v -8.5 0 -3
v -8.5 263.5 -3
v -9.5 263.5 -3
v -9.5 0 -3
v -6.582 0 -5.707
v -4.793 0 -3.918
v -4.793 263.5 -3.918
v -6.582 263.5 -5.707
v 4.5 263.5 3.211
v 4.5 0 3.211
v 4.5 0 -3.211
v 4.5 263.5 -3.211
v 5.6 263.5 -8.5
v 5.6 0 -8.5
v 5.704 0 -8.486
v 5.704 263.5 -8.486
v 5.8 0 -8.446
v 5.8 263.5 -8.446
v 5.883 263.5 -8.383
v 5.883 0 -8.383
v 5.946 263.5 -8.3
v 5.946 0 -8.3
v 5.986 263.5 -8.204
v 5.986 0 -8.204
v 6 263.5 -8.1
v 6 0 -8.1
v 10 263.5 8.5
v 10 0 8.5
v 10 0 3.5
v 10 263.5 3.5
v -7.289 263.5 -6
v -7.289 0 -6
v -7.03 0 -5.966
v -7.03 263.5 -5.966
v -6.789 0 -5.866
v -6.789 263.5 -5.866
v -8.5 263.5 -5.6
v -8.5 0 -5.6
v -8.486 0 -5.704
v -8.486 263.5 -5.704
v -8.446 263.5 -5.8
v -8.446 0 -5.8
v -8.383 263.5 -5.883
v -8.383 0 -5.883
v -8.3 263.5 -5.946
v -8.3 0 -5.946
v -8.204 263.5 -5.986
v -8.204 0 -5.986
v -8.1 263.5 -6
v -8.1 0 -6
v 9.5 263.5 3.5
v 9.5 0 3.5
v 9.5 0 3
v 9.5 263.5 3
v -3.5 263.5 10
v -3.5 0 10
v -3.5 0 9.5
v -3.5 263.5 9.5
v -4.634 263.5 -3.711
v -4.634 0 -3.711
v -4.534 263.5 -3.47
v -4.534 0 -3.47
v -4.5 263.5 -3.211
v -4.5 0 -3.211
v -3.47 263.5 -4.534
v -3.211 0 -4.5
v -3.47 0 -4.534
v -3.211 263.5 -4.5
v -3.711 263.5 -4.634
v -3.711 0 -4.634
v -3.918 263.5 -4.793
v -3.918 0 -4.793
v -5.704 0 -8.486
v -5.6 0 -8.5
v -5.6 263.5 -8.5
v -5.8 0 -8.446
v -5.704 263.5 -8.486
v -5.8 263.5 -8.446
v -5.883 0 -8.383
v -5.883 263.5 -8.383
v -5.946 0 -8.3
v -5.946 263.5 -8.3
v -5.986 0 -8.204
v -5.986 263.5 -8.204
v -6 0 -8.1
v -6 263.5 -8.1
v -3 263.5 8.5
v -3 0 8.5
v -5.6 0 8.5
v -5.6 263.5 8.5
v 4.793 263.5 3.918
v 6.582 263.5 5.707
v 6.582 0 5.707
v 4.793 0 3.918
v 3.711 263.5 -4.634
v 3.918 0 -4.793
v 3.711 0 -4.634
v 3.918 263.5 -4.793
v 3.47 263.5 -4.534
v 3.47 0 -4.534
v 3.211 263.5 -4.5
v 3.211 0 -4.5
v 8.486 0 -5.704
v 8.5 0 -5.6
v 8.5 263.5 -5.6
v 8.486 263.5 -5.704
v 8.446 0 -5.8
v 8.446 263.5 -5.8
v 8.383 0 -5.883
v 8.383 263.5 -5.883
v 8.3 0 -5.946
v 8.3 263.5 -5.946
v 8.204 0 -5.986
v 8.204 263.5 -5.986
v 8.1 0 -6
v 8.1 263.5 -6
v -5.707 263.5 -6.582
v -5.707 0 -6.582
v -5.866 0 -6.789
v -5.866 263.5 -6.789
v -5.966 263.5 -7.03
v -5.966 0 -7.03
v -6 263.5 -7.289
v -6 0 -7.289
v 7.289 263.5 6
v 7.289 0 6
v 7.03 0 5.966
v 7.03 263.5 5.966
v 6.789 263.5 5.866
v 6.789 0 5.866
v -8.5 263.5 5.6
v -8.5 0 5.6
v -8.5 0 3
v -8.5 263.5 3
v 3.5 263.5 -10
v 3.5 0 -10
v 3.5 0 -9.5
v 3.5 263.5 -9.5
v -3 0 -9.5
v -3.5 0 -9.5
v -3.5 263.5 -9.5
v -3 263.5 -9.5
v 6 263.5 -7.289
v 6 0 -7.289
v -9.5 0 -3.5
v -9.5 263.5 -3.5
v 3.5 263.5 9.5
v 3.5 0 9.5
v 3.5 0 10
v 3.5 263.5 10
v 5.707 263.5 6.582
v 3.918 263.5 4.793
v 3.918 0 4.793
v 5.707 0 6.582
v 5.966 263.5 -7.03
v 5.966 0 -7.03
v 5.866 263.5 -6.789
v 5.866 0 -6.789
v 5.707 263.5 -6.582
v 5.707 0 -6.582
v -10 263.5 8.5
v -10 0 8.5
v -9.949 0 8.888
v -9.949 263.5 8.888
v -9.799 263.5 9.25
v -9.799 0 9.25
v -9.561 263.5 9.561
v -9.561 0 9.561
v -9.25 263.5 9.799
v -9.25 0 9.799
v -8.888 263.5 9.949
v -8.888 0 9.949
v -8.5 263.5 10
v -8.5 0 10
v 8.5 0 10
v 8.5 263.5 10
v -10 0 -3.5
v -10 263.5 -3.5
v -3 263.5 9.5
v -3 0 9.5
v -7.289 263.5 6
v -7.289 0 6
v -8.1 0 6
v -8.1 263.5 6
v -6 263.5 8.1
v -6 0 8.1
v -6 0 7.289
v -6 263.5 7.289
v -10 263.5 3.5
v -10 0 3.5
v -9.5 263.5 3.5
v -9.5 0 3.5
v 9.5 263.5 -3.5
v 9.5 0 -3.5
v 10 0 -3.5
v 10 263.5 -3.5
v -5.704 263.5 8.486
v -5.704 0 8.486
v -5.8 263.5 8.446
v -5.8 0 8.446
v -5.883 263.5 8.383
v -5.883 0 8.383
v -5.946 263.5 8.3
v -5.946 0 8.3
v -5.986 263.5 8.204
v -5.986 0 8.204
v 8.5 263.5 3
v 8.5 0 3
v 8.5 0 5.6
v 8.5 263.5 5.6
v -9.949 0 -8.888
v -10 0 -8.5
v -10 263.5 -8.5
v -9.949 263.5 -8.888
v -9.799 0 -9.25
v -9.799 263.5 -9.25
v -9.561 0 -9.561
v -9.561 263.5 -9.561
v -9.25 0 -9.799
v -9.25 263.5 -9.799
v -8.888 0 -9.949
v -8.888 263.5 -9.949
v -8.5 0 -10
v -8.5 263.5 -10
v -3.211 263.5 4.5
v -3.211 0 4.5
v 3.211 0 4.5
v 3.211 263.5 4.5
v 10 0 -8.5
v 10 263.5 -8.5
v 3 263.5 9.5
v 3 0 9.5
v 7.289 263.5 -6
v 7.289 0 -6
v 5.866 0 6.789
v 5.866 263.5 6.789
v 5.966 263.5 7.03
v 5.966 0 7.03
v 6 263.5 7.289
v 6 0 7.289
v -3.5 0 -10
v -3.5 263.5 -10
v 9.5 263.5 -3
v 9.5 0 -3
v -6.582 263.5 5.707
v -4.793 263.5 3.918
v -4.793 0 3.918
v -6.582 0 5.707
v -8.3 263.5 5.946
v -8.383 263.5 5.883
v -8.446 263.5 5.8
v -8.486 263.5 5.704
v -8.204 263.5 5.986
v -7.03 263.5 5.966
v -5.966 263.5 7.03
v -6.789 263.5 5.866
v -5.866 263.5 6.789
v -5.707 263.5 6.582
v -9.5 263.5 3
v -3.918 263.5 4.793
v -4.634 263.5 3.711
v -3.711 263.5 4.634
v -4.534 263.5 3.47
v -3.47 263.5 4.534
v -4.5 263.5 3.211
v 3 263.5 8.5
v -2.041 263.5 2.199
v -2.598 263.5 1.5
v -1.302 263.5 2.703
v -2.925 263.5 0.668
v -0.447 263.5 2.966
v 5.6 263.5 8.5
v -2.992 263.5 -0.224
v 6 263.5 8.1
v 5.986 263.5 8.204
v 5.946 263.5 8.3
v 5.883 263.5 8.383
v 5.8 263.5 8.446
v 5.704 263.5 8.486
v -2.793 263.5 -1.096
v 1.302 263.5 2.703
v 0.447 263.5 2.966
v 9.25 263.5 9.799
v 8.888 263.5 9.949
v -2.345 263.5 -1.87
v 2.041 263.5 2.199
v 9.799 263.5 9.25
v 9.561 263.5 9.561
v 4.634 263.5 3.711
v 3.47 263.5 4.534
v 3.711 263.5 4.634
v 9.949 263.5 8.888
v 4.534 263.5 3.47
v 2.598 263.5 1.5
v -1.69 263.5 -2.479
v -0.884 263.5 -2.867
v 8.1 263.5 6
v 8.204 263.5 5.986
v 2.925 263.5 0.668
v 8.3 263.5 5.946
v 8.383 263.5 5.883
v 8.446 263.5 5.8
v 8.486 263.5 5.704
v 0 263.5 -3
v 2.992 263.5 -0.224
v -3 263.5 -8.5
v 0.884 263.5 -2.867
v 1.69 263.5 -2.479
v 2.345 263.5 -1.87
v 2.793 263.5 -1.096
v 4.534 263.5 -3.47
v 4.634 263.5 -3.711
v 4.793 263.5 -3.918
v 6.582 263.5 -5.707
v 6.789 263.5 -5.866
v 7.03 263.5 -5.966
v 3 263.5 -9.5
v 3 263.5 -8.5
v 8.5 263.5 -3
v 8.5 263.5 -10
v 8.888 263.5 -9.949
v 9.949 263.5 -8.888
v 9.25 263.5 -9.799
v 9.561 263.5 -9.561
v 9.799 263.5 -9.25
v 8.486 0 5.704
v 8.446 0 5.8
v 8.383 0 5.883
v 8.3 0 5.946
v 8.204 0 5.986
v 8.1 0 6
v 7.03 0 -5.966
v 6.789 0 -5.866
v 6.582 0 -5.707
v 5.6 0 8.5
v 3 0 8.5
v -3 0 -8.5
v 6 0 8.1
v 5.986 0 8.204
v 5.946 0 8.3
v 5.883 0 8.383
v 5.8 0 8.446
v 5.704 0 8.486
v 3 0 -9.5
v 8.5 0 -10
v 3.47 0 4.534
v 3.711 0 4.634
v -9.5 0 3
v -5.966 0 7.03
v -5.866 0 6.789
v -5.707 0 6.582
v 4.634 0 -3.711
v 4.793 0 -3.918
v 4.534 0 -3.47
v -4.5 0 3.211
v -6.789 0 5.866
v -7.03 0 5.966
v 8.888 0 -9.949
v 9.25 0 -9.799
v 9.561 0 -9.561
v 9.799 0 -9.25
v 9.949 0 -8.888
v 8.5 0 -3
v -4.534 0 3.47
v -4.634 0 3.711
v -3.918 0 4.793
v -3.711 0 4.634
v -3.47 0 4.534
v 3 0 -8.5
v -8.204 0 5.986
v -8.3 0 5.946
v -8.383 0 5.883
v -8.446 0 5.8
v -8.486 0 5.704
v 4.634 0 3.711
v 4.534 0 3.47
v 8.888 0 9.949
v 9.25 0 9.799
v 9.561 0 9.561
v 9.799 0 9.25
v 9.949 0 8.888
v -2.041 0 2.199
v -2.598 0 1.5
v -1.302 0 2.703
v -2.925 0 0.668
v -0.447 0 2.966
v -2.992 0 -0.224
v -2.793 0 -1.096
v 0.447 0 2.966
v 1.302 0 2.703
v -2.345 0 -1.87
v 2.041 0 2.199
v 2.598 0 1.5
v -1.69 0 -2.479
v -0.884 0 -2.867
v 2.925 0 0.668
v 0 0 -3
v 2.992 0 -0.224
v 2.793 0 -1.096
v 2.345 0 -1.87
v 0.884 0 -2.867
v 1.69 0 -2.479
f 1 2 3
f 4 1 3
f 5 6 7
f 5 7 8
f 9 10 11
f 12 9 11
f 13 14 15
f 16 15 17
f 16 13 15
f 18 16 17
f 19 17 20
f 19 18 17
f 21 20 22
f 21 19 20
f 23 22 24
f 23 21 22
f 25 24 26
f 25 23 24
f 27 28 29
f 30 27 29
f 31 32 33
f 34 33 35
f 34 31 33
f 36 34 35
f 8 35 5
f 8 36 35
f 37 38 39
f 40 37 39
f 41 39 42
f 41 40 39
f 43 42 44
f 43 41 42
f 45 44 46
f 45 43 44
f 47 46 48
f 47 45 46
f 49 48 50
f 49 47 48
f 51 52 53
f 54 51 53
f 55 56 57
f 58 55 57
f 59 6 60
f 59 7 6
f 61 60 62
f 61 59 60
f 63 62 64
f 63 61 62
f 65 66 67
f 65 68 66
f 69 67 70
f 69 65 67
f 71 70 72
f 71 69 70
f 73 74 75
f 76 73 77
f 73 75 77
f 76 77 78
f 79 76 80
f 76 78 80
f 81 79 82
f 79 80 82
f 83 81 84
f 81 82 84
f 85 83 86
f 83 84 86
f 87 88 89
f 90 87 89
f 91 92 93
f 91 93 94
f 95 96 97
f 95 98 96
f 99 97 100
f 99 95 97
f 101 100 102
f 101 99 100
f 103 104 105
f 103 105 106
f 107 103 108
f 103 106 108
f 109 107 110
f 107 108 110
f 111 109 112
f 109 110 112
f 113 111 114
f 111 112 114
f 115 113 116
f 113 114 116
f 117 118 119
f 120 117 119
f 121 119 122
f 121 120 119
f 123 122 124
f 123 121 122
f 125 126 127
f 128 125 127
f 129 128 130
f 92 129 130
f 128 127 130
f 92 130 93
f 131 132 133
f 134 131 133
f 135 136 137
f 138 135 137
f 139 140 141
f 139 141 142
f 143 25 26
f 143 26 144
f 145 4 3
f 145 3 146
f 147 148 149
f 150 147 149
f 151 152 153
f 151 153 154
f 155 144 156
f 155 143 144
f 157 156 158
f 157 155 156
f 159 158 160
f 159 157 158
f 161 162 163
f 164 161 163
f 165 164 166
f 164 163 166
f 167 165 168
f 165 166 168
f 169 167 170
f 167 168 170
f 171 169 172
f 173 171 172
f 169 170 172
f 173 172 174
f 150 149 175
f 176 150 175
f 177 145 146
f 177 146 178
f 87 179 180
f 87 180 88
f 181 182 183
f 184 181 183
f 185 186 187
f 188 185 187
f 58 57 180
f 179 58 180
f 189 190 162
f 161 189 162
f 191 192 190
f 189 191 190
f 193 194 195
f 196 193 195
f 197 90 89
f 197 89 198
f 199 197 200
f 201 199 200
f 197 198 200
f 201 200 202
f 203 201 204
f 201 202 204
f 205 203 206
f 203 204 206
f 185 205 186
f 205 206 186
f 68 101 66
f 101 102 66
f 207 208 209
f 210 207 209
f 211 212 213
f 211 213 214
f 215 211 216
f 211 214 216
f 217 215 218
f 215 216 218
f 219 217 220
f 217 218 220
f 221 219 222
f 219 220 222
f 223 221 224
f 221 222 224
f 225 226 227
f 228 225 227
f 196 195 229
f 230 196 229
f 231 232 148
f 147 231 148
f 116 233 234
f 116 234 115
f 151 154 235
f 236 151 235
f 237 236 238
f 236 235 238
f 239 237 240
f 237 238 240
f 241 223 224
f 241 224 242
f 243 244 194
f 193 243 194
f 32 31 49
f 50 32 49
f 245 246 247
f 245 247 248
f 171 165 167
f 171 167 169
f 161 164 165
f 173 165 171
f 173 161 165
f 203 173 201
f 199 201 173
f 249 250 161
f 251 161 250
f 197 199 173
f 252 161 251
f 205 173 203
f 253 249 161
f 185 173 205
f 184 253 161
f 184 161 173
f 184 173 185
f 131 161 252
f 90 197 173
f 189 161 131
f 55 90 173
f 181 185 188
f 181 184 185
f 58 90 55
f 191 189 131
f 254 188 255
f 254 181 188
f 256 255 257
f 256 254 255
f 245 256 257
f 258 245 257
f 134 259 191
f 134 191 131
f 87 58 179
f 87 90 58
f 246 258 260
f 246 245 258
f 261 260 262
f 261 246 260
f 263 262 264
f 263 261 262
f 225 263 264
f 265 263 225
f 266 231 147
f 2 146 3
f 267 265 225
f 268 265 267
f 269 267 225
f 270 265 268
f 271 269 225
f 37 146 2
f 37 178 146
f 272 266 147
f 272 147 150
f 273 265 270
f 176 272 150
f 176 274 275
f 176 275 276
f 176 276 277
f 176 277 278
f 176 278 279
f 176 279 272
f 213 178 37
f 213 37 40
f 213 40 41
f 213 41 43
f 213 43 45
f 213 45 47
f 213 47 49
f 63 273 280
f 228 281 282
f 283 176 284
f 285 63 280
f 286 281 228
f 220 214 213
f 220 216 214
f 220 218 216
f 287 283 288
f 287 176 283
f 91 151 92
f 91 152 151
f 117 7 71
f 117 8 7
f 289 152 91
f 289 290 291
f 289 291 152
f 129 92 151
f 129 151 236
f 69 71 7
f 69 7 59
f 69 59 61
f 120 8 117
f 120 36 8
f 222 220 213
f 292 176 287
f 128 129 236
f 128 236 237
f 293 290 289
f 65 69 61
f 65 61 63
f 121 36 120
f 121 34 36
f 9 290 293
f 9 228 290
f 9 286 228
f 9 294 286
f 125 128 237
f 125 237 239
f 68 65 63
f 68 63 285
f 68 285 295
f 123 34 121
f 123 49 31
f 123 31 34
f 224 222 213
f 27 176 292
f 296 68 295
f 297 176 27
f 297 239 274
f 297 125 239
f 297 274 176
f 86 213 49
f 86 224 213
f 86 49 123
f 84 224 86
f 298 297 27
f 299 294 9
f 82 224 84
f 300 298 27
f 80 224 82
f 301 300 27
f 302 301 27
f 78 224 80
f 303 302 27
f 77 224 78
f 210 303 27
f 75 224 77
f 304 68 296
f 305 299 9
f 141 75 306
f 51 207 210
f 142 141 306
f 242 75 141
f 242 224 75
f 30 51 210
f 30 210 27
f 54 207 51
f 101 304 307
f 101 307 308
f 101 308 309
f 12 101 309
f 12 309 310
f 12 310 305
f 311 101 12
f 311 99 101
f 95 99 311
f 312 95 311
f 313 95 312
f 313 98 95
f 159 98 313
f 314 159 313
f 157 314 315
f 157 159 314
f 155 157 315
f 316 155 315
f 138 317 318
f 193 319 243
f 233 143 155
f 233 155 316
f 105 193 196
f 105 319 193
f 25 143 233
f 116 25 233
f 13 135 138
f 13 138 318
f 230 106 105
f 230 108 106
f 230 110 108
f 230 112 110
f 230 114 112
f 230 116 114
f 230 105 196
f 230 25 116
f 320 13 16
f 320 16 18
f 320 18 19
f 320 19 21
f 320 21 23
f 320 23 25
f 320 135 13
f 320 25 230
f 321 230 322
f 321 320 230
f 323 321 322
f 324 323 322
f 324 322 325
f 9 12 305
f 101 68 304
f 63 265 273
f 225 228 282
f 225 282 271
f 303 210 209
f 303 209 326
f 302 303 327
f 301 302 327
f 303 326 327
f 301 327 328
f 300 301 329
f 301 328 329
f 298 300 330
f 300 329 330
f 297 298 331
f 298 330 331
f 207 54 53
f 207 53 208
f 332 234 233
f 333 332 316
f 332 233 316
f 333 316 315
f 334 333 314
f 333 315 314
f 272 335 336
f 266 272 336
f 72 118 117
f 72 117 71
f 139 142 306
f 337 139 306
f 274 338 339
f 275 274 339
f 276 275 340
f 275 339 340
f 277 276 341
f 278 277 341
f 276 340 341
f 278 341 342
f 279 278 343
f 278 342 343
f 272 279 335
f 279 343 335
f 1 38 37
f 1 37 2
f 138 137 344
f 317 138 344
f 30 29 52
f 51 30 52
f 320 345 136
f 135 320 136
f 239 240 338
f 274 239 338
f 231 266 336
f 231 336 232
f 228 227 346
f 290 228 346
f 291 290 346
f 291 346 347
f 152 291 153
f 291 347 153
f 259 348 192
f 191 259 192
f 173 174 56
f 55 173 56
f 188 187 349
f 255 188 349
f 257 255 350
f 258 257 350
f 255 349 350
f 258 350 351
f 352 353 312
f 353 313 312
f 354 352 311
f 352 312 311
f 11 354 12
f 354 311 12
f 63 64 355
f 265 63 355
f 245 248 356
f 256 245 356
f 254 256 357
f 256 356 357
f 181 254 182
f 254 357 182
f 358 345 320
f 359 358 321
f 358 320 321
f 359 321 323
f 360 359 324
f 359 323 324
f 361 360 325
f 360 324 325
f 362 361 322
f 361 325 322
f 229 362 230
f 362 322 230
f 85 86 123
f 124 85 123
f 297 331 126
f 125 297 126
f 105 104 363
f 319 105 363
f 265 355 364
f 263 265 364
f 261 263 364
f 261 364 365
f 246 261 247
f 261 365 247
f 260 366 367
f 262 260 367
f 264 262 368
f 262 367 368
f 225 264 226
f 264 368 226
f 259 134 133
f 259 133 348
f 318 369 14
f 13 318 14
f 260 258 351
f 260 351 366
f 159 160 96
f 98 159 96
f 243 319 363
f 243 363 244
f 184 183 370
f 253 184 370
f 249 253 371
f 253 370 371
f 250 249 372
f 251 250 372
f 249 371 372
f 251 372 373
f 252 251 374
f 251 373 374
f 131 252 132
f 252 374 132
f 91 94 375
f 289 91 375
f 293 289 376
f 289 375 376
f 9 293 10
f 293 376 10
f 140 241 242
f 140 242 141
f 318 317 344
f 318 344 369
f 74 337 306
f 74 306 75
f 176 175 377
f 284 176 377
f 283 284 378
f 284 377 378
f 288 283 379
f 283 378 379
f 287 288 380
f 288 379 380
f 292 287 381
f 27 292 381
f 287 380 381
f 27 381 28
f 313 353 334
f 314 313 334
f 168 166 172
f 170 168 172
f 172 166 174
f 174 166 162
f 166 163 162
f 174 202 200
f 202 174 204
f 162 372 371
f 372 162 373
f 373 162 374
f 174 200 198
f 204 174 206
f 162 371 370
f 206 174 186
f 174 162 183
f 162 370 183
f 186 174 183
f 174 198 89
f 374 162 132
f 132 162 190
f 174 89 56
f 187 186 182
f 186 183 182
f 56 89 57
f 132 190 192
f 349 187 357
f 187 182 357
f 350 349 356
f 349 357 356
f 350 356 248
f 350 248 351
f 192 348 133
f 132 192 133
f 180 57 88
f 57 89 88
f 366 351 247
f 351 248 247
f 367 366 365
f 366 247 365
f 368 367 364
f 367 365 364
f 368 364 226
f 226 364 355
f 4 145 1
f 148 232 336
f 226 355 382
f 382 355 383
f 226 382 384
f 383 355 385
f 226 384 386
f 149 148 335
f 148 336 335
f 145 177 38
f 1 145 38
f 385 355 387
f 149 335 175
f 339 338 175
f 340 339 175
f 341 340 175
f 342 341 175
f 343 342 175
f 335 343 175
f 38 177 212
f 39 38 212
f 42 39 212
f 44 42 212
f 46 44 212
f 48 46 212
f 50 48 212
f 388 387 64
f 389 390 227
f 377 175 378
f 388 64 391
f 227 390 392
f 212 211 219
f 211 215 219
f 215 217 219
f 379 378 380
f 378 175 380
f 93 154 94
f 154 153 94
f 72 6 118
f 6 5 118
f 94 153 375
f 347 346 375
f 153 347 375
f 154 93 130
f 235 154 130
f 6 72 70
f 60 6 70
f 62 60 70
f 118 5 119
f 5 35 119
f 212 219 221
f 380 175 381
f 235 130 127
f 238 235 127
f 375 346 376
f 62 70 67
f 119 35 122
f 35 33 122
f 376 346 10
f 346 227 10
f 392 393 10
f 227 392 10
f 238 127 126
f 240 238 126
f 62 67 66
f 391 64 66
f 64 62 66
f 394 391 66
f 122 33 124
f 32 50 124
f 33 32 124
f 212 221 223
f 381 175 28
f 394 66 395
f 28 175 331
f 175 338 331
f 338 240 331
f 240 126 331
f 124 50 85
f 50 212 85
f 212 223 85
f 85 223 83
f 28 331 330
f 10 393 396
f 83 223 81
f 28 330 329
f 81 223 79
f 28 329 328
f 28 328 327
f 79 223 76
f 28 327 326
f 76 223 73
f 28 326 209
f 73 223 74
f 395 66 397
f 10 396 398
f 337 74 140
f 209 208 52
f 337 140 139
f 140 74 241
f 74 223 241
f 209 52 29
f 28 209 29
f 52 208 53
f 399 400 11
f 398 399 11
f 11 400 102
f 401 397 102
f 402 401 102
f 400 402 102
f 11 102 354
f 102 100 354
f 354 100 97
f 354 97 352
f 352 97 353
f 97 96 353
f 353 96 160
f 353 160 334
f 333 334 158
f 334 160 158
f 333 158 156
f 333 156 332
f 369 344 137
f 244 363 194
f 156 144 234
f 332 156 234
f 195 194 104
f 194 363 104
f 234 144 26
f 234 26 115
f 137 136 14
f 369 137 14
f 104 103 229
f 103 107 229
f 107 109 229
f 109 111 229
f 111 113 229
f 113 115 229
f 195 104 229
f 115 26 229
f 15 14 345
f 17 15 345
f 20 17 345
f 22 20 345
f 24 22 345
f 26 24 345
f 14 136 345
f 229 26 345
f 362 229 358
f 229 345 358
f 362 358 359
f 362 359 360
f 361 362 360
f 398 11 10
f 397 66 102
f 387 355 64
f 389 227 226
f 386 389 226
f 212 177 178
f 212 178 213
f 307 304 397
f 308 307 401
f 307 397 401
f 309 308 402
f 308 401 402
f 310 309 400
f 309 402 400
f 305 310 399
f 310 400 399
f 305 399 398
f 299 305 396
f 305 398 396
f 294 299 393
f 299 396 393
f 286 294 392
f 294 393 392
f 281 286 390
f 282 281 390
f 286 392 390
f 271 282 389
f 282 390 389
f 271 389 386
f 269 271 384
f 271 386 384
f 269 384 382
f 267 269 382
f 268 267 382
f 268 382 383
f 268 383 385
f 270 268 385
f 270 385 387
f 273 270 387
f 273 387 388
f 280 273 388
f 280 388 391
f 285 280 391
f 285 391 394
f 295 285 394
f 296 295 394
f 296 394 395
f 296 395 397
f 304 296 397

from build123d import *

# Parameters (mm, degrees)
BOSS_EXTRU_1_CORPS_DEPTH    = 263.5
CONG_1_R                    = 1.5
CONG_2_R                    = 0.4
CONG_4_R                    = 1
CONG_1_OF_SYM_TRIE_BRAS_R   = 1.5
CONG_2_OF_SYM_TRIE_BRAS_R   = 0.4
CONG_4_OF_SYM_TRIE_BRAS_R   = 1
SYM_TRIE_BRAS_DOUBLE_DEPTH  = 263.5
APR_S_TARODAGE_M6_R         = 3
ENL_V_MAT_FILETAGE_M6_DEPTH = 264.879233741


# Read off the part's stored shape, not the designer's step: Symétrie Bras double
with BuildPart() as part:
    # Esquisse4 → Boss.-Extru.1 Corps (new body)
    with BuildSketch(Plane(origin=(0, 0, 0), x_dir=(1, 0, 0), z_dir=(0, 1, 0))):
        Polygon((0, 0), (-4.5, 0), (-4.5, 3.625), (-6.875, 6), (-8.5, 6), (-8.5, 3), (-9.5, 3), (-9.5, 3.5), (-10, 3.5), (-10, 10), (-3.5, 10), (-3.5, 9.5), (-3, 9.5), (-3, 8.5), (-6, 8.5), (-6, 6.875), (-3.625, 4.5), (0, 4.5), align=None)
    boss_extru_1_corps = extrude(amount=BOSS_EXTRU_1_CORPS_DEPTH)

    # Congé1
    cong_1_edges = [part.edges().sort_by_distance(p)[0] for p in [
        (-10, 131.75, -10),
    ]]
    fillet(cong_1_edges, radius=CONG_1_R)

    # Congé2
    cong_2_edges = [part.edges().sort_by_distance(p)[0] for p in [
        (-8.5, 131.75, -6),
        (-6, 131.75, -8.5),
    ]]
    fillet(cong_2_edges, radius=CONG_2_R)

    # Congé4
    cong_4_edges = [part.edges().sort_by_distance(p)[0] for p in [
        (-4.5, 131.75, -3.625),
        (-6.875, 131.75, -6),
        (-6, 131.75, -6.875),
        (-3.625, 131.75, -4.5),
    ]]
    fillet(cong_4_edges, radius=CONG_4_R)

    # Symétrie Bras: Boss.-Extru.1 Corps across plane
    add(boss_extru_1_corps.mirror(Plane(origin=(0, 263.5, -4.5), x_dir=(0, 0, 1), z_dir=(-1, 0, 0))))

    # Congé1 of Symétrie Bras
    cong_1_of_sym_trie_bras_edges = [part.edges().sort_by_distance(p)[0] for p in [
        (10, 131.75, -10),
    ]]
    fillet(cong_1_of_sym_trie_bras_edges, radius=CONG_1_OF_SYM_TRIE_BRAS_R)

    # Congé2 of Symétrie Bras
    cong_2_of_sym_trie_bras_edges = [part.edges().sort_by_distance(p)[0] for p in [
        (8.5, 131.75, -6),
        (6, 131.75, -8.5),
    ]]
    fillet(cong_2_of_sym_trie_bras_edges, radius=CONG_2_OF_SYM_TRIE_BRAS_R)

    # Congé4 of Symétrie Bras
    cong_4_of_sym_trie_bras_edges = [part.edges().sort_by_distance(p)[0] for p in [
        (4.5, 131.75, -3.625),
        (6.875, 131.75, -6),
        (6, 131.75, -6.875),
        (3.625, 131.75, -4.5),
    ]]
    fillet(cong_4_of_sym_trie_bras_edges, radius=CONG_4_OF_SYM_TRIE_BRAS_R)

    # Symétrie Bras double outline → Symétrie Bras double (add)
    with BuildSketch(Plane(origin=(0, 0, 0), x_dir=(1, 0, 0), z_dir=(0, 1, 0))):
        with BuildLine():
            ThreePointArc((7.289213562, -6), (6.90653013, -5.923879533), (6.582106781, -5.707106781))
            Line((6.582106781, -5.707106781), (4.792893219, -3.917893219))
            ThreePointArc((4.792893219, -3.917893219), (4.576120467, -3.59346987), (4.5, -3.210786438))
            Line((4.5, -3.210786438), (4.5, 0))
            Line((4.5, 0), (-4.5, 0))
            Line((-4.5, 0), (-4.5, -3.210786438))
            ThreePointArc((-4.5, -3.210786438), (-4.576120467, -3.59346987), (-4.792893219, -3.917893219))
            Line((-4.792893219, -3.917893219), (-6.582106781, -5.707106781))
            ThreePointArc((-6.582106781, -5.707106781), (-6.90653013, -5.923879533), (-7.289213562, -6))
            Line((-7.289213562, -6), (-8.1, -6))
            ThreePointArc((-8.1, -6), (-8.382842712, -5.882842712), (-8.5, -5.6))
            Line((-8.5, -5.6), (-8.5, -3))
            Line((-8.5, -3), (-9.5, -3))
            Line((-9.5, -3), (-9.5, -3.5))
            Line((-9.5, -3.5), (-10, -3.5))
            Line((-10, -3.5), (-10, -8.5))
            ThreePointArc((-10, -8.5), (-9.560660172, -9.560660172), (-8.5, -10))
            Line((-8.5, -10), (-3.5, -10))
            Line((-3.5, -10), (-3.5, -9.5))
            Line((-3.5, -9.5), (-3, -9.5))
            Line((-3, -9.5), (-3, -8.5))
            Line((-3, -8.5), (-5.6, -8.5))
            ThreePointArc((-5.6, -8.5), (-5.882842712, -8.382842712), (-6, -8.1))
            Line((-6, -8.1), (-6, -7.289213562))
            ThreePointArc((-6, -7.289213562), (-5.923879533, -6.90653013), (-5.707106781, -6.582106781))
            Line((-5.707106781, -6.582106781), (-3.917893219, -4.792893219))
            ThreePointArc((-3.917893219, -4.792893219), (-3.59346987, -4.576120467), (-3.210786438, -4.5))
            Line((-3.210786438, -4.5), (3.210786438, -4.5))
            ThreePointArc((3.210786438, -4.5), (3.59346987, -4.576120467), (3.917893219, -4.792893219))
            Line((3.917893219, -4.792893219), (5.707106781, -6.582106781))
            ThreePointArc((5.707106781, -6.582106781), (5.923879533, -6.90653013), (6, -7.289213562))
            Line((6, -7.289213562), (6, -8.1))
            ThreePointArc((6, -8.1), (5.882842712, -8.382842712), (5.6, -8.5))
            Line((5.6, -8.5), (3, -8.5))
            Line((3, -8.5), (3, -9.5))
            Line((3, -9.5), (3.5, -9.5))
            Line((3.5, -9.5), (3.5, -10))
            Line((3.5, -10), (8.5, -10))
            ThreePointArc((8.5, -10), (9.560660172, -9.560660172), (10, -8.5))
            Line((10, -8.5), (10, -3.5))
            Line((10, -3.5), (9.5, -3.5))
            Line((9.5, -3.5), (9.5, -3))
            Line((9.5, -3), (8.5, -3))
            Line((8.5, -3), (8.5, -5.6))
            ThreePointArc((8.5, -5.6), (8.382842712, -5.882842712), (8.1, -6))
            Line((8.1, -6), (7.289213562, -6))
        make_face()
    extrude(amount=SYM_TRIE_BRAS_DOUBLE_DEPTH)

    # Après tarodage M6 → Enlèv. mat.-Filetage M6 (cut, through all)
    with BuildSketch(Plane.XZ):
        with Locations(Location((0, 0, 0), (0, 0, 270))):
            Circle(APR_S_TARODAGE_M6_R)
    extrude(amount=-ENL_V_MAT_FILETAGE_M6_DEPTH, mode=Mode.SUBTRACT)


solid = part.part
